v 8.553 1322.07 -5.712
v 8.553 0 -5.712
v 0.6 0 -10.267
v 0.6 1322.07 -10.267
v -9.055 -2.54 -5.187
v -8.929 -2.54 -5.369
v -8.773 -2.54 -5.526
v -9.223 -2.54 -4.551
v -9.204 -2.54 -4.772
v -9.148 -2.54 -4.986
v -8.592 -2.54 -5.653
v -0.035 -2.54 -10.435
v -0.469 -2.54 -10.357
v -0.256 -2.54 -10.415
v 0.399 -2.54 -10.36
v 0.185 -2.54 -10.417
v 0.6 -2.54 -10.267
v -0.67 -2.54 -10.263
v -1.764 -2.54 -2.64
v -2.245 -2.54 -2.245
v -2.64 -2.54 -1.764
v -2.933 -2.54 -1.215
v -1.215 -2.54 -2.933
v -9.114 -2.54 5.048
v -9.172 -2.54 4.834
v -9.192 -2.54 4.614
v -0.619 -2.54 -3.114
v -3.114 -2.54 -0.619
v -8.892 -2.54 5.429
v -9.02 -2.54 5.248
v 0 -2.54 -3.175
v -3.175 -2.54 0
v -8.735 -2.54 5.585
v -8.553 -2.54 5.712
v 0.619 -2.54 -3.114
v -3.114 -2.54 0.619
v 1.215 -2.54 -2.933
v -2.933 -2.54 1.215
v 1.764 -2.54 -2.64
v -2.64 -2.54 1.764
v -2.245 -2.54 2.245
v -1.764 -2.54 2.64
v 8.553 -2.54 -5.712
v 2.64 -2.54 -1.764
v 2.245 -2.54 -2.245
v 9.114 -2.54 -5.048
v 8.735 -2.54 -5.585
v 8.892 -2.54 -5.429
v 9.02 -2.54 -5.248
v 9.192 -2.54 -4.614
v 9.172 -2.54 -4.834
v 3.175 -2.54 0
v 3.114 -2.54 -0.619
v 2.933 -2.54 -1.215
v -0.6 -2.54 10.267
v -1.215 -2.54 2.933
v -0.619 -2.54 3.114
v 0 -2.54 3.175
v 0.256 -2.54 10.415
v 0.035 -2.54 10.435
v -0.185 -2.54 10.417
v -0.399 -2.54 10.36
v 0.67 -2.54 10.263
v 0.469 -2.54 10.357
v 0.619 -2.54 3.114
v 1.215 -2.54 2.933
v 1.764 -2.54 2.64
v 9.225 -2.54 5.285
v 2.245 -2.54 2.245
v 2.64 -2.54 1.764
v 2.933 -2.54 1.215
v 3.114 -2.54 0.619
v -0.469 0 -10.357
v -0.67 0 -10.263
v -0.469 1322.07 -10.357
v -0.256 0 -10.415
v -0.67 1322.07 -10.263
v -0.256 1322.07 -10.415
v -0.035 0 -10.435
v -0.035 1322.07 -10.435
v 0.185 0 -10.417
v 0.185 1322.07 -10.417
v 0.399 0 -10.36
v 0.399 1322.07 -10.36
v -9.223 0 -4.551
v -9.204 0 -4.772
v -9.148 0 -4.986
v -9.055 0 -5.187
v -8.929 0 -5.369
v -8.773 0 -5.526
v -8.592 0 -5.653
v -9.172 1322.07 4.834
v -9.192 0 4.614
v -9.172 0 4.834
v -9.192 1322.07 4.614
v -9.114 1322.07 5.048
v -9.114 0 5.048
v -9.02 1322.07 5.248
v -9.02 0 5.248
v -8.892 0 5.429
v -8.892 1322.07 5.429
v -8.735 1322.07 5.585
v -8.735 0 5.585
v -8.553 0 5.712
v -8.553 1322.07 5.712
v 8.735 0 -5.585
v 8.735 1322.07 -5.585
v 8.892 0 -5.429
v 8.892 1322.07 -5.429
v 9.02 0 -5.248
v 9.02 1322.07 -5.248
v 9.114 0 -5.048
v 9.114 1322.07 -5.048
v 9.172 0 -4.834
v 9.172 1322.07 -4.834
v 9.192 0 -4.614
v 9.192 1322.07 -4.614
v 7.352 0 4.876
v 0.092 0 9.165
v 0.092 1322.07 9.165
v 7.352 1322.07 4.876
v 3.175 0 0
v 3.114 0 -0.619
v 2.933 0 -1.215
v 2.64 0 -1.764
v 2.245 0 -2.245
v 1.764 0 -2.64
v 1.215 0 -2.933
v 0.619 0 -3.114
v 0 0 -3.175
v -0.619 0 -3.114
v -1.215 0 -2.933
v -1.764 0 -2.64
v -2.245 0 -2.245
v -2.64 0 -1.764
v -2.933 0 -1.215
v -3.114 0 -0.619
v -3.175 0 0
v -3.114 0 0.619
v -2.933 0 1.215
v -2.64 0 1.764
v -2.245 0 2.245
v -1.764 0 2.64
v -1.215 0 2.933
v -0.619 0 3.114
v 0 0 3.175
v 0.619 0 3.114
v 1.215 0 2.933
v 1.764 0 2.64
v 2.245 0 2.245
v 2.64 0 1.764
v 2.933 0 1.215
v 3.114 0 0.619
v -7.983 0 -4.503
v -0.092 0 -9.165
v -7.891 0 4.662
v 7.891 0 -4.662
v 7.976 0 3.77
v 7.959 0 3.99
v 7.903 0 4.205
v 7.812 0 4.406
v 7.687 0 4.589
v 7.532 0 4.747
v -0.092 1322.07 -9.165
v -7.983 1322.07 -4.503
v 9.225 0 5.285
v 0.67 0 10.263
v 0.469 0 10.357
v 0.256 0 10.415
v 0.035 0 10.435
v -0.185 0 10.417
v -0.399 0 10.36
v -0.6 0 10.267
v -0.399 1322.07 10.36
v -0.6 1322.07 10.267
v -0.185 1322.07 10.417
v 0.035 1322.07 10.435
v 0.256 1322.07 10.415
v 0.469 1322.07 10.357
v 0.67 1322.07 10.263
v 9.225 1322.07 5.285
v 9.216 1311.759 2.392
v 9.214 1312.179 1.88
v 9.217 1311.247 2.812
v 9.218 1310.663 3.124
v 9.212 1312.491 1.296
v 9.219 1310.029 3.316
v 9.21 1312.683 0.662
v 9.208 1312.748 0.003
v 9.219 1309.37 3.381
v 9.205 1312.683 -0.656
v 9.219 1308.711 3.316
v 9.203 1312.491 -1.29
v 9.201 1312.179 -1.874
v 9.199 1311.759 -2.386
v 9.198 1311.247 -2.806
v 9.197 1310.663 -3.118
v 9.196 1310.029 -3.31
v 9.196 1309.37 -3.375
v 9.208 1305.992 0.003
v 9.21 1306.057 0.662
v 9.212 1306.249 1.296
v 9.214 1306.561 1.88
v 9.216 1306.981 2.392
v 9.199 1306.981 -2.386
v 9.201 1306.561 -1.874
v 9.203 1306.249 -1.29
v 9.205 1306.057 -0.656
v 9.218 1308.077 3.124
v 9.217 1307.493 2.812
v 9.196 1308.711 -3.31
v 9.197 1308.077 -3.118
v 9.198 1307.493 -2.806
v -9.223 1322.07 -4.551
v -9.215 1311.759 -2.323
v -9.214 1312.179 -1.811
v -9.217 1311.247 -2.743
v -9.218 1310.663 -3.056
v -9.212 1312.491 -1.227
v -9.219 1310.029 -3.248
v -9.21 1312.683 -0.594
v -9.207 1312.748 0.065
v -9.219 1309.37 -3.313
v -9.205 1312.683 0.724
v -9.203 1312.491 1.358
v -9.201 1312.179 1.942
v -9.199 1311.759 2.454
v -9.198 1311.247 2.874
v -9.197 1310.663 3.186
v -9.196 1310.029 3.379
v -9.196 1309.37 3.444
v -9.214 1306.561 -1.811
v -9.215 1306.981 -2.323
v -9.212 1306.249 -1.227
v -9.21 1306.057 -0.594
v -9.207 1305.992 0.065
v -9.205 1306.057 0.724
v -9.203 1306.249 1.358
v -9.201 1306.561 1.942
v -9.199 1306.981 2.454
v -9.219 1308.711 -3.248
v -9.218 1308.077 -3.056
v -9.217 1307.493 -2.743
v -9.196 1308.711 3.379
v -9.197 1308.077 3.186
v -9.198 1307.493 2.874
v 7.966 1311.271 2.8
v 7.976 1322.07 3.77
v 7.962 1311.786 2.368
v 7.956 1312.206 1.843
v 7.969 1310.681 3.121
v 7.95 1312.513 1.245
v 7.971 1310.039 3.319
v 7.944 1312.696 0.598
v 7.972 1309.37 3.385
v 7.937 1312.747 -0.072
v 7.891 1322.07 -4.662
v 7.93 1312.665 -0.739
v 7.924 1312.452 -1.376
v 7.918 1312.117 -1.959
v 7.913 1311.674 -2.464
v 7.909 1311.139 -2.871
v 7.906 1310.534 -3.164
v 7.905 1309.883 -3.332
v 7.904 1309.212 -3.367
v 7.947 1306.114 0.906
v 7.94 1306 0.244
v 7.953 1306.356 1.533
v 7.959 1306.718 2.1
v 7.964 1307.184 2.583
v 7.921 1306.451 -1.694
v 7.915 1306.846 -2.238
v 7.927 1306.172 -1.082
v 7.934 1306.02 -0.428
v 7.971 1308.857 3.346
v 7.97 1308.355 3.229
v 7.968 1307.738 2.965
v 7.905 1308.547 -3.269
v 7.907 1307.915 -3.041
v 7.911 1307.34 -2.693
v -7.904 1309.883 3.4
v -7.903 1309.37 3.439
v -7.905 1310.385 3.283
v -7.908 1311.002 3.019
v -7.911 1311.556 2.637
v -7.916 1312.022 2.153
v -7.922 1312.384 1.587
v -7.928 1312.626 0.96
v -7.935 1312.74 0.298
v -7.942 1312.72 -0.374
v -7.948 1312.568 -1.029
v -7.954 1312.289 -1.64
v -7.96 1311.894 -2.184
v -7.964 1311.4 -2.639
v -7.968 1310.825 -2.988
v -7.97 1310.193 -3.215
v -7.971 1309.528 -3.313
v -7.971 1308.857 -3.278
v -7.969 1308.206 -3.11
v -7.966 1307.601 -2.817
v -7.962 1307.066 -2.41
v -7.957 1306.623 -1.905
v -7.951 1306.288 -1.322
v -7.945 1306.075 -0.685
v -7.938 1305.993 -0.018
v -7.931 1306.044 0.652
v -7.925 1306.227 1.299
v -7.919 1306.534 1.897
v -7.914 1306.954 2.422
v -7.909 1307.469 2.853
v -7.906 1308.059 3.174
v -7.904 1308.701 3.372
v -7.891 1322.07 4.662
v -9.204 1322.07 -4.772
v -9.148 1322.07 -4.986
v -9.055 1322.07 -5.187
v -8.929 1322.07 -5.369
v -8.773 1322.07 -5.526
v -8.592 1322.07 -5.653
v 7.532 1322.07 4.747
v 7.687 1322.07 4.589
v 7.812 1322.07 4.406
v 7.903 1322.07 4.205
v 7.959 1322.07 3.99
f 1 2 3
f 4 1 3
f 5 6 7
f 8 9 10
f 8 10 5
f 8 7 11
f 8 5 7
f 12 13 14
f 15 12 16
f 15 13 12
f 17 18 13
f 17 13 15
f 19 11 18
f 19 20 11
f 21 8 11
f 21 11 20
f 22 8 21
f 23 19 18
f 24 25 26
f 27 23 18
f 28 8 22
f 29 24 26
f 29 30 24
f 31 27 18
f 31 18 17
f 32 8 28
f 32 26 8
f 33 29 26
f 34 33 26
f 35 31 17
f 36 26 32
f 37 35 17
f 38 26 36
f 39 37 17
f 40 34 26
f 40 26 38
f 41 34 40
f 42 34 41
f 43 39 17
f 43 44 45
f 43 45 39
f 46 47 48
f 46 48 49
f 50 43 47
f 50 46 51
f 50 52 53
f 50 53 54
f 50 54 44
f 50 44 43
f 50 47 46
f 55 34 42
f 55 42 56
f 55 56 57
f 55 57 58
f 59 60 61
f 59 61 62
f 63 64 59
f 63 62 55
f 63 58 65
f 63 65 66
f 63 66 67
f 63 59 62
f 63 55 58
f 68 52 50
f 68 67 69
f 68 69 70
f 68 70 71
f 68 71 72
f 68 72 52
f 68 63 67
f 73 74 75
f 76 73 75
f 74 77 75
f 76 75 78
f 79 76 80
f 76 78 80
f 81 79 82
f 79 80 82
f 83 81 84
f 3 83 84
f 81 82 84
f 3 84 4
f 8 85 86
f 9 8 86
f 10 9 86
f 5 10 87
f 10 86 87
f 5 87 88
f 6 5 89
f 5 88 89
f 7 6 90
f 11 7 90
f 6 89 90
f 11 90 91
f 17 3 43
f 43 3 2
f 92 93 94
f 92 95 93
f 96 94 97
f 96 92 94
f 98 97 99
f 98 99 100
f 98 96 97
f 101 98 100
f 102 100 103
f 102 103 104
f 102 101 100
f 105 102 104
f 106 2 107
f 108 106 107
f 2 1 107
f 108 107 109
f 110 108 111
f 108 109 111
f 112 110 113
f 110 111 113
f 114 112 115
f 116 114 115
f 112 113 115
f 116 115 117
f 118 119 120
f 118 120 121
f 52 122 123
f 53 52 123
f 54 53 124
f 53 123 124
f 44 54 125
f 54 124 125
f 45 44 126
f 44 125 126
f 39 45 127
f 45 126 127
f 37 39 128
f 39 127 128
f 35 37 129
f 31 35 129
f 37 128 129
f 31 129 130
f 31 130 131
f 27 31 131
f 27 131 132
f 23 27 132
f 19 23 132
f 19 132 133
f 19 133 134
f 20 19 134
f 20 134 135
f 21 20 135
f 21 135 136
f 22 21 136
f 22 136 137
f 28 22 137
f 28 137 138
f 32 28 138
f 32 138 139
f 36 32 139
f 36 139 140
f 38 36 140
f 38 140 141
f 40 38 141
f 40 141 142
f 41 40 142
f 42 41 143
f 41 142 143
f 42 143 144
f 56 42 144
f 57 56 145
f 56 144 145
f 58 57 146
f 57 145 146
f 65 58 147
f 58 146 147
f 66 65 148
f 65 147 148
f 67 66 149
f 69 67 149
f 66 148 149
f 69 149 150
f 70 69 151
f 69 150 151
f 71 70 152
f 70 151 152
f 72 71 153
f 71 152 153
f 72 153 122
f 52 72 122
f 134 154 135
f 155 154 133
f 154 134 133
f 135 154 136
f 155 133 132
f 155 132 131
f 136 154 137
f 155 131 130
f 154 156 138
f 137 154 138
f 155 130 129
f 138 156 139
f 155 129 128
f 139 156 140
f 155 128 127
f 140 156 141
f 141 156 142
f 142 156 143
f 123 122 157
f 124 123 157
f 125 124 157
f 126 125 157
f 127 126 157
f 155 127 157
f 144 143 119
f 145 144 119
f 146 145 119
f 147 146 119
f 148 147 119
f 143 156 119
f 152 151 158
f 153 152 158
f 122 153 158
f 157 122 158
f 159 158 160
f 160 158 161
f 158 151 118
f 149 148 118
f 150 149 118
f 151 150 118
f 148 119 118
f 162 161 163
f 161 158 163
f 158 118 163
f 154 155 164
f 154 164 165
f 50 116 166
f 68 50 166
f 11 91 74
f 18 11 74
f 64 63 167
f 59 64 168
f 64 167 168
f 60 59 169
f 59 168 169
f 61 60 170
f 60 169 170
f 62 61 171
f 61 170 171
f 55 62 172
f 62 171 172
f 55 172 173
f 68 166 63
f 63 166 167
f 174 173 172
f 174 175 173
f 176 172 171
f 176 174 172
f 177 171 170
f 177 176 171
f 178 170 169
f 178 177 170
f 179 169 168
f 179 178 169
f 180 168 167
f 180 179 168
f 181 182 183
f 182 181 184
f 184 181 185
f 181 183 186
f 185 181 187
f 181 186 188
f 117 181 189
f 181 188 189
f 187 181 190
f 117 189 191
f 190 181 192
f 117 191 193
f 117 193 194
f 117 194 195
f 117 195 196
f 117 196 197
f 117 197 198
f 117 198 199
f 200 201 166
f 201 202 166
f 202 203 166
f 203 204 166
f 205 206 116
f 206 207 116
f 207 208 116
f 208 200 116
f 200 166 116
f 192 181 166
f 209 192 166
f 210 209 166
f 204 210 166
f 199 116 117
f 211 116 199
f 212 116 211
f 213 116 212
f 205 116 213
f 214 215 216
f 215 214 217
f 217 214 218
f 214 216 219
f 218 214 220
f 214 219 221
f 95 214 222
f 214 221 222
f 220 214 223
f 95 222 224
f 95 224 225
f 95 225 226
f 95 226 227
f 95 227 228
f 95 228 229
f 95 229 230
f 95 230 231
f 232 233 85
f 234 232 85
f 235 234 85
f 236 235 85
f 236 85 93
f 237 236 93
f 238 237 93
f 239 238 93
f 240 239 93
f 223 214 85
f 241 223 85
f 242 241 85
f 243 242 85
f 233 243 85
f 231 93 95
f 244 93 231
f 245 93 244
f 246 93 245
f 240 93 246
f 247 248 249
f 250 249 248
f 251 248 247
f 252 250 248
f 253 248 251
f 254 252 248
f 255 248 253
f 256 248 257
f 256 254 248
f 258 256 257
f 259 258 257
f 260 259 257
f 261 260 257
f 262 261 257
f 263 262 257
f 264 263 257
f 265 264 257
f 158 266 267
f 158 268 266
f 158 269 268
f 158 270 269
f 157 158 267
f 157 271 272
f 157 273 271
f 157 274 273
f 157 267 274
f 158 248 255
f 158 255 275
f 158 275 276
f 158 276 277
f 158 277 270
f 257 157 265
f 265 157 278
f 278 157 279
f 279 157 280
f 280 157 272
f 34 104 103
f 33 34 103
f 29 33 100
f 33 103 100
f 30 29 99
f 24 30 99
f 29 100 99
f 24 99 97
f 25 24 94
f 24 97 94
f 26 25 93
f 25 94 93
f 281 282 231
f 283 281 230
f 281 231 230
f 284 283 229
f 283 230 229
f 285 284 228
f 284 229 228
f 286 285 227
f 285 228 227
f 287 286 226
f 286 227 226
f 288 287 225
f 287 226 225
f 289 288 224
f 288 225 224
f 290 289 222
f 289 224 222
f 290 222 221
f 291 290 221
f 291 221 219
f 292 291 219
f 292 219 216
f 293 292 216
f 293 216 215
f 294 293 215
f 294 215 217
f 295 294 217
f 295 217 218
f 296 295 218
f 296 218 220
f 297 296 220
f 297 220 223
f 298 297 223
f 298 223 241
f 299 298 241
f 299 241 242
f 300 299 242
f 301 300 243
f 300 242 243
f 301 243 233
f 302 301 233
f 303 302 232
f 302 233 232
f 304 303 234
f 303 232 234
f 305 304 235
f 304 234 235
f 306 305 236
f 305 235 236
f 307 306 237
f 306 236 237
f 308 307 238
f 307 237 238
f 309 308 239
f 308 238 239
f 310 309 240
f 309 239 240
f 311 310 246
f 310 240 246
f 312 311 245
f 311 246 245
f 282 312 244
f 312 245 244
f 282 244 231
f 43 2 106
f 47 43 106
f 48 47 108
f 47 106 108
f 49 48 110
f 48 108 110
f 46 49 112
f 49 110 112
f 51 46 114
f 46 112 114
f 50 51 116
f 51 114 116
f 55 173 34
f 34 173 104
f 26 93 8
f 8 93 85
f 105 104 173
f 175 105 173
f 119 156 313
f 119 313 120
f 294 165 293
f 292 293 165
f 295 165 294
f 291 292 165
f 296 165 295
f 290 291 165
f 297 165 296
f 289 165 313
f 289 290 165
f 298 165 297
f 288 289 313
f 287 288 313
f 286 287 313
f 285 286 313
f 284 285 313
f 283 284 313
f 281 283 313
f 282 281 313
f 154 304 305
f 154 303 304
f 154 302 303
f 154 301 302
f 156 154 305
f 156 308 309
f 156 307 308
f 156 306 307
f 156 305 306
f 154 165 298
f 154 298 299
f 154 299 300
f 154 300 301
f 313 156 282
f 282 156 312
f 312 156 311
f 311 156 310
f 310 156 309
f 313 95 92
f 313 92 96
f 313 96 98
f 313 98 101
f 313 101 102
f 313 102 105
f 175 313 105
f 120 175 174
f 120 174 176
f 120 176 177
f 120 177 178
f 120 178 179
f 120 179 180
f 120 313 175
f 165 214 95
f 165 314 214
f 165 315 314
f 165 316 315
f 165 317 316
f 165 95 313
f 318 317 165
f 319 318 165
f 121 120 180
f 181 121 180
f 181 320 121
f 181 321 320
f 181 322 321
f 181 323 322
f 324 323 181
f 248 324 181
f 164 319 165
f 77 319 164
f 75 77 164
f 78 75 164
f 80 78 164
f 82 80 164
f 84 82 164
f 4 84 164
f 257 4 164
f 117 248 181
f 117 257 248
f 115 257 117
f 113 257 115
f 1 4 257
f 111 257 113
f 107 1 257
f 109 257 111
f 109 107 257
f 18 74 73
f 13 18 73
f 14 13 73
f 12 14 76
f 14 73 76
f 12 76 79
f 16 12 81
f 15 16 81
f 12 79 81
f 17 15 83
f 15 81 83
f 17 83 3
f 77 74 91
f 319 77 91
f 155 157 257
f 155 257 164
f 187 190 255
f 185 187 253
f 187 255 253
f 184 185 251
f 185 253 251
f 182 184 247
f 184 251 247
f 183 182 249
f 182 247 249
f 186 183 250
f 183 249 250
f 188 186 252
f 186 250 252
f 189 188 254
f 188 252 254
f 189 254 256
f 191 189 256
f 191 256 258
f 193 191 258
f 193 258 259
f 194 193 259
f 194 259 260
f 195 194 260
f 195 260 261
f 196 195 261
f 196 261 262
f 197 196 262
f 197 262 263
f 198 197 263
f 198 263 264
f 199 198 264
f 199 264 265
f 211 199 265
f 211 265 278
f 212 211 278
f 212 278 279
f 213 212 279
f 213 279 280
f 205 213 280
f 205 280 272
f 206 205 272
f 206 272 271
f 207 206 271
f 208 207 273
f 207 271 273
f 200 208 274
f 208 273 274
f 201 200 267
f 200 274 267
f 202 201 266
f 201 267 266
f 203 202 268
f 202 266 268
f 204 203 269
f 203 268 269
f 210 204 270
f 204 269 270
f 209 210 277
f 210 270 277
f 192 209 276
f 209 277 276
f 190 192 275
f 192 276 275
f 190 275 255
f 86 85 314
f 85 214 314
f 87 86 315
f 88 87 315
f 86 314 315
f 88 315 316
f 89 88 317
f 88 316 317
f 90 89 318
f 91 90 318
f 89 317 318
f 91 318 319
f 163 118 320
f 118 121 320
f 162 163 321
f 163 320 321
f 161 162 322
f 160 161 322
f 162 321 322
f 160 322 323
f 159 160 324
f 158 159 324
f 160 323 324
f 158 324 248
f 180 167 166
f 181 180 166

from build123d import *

# Parameters (mm, degrees)
BOSS_EXTRUDE1_DEPTH         = 1322.07
FILLET1_R                   = 1.27
BOSS_EXTRUDE2_DEPTH         = 2.54
F_1_4_0_25_DIAMETER_HOLE1_D = 6.35
F_1_4_CLEARANCE_HOLE1_D     = 6.7564


with BuildPart() as part:
    # Sketch1 → Boss-Extrude1 (new body)
    with BuildSketch(Plane(origin=(0, 0, 0), x_dir=(1, 0, 0), z_dir=(0, 1, 0))):
        Polygon((-9.225470009, 5.284705426), (-9.189424155, -5.347138677), (0.036045854, -10.631844103), (9.225470009, -5.284705426), (9.189424155, 5.347138677), (-0.036045854, 10.631844103), align=None)
        Polygon((-7.98301547, 4.502962617), (-7.891187754, -4.662012887), (0.091827716, -9.164975505), (7.98301547, -4.502962617), (7.891187754, 4.662012887), (-0.091827716, 9.164975505), align=None, mode=Mode.SUBTRACT)
    extrude(amount=BOSS_EXTRUDE1_DEPTH)

    # Fillet1
    fillet1_edges = [part.edges().sort_by_distance(p)[0] for p in [
        (-0.036045854, 661.035, -10.631844103),
        (9.189424155, 661.035, -5.347138677),
        (0.036045854, 661.035, 10.631844103),
        (-9.189424155, 661.035, 5.347138677),
        (-9.225470009, 661.035, -5.284705426),
        (7.98301547, 661.035, 4.502962617),
    ]]
    fillet(fillet1_edges, radius=FILLET1_R)

    # Sketch3 → Boss-Extrude2 (add)
    with BuildSketch(Plane.XZ):
        with BuildLine():
            Line((0.600193457, -10.26738166), (8.553184844, -5.71160112))
            ThreePointArc((8.553184844, -5.71160112), (9.019610446, -5.24832754), (9.191910076, -4.613908049))
            Line((9.191910076, -4.613908049), (9.225470009, 5.284705426))
            Line((9.225470009, 5.284705426), (0.669799244, 10.263075918))
            ThreePointArc((0.669799244, 10.263075918), (0.035379754, 10.435375548), (-0.600193457, 10.26738166))
            Line((-0.600193457, 10.26738166), (-8.553184844, 5.71160112))
            ThreePointArc((-8.553184844, 5.71160112), (-9.019610446, 5.24832754), (-9.191910076, 4.613908049))
            Line((-9.191910076, 4.613908049), (-9.222984088, -4.551474798))
            ThreePointArc((-9.222984088, -4.551474798), (-9.0549902, -5.187048009), (-8.591716619, -5.653473611))
            Line((-8.591716619, -5.653473611), (-0.669799244, -10.263075918))
            ThreePointArc((-0.669799244, -10.263075918), (-0.035379754, -10.435375548), (0.600193457, -10.26738166))
        make_face()
    extrude(amount=BOSS_EXTRUDE2_DEPTH)

    # 1/4 (0.25) Diameter Hole1 (through all)
    with Locations(Plane(origin=(0, -2.54, 0), x_dir=(-1, 0, 0), z_dir=(0, -1, 0))):
        with Locations((0, 0)):
            Hole(F_1_4_0_25_DIAMETER_HOLE1_D / 2)

    # 1/4 Clearance Hole1 (through all)
    with Locations(Plane(origin=(9.207563136, 0, 0.003013921), x_dir=(-0.003390348, 0, -0.999994253), z_dir=(0.999994253, 0, -0.003390348))):
        with Locations((0, 1309.37)):
            Hole(F_1_4_CLEARANCE_HOLE1_D / 2)


solid = part.part
